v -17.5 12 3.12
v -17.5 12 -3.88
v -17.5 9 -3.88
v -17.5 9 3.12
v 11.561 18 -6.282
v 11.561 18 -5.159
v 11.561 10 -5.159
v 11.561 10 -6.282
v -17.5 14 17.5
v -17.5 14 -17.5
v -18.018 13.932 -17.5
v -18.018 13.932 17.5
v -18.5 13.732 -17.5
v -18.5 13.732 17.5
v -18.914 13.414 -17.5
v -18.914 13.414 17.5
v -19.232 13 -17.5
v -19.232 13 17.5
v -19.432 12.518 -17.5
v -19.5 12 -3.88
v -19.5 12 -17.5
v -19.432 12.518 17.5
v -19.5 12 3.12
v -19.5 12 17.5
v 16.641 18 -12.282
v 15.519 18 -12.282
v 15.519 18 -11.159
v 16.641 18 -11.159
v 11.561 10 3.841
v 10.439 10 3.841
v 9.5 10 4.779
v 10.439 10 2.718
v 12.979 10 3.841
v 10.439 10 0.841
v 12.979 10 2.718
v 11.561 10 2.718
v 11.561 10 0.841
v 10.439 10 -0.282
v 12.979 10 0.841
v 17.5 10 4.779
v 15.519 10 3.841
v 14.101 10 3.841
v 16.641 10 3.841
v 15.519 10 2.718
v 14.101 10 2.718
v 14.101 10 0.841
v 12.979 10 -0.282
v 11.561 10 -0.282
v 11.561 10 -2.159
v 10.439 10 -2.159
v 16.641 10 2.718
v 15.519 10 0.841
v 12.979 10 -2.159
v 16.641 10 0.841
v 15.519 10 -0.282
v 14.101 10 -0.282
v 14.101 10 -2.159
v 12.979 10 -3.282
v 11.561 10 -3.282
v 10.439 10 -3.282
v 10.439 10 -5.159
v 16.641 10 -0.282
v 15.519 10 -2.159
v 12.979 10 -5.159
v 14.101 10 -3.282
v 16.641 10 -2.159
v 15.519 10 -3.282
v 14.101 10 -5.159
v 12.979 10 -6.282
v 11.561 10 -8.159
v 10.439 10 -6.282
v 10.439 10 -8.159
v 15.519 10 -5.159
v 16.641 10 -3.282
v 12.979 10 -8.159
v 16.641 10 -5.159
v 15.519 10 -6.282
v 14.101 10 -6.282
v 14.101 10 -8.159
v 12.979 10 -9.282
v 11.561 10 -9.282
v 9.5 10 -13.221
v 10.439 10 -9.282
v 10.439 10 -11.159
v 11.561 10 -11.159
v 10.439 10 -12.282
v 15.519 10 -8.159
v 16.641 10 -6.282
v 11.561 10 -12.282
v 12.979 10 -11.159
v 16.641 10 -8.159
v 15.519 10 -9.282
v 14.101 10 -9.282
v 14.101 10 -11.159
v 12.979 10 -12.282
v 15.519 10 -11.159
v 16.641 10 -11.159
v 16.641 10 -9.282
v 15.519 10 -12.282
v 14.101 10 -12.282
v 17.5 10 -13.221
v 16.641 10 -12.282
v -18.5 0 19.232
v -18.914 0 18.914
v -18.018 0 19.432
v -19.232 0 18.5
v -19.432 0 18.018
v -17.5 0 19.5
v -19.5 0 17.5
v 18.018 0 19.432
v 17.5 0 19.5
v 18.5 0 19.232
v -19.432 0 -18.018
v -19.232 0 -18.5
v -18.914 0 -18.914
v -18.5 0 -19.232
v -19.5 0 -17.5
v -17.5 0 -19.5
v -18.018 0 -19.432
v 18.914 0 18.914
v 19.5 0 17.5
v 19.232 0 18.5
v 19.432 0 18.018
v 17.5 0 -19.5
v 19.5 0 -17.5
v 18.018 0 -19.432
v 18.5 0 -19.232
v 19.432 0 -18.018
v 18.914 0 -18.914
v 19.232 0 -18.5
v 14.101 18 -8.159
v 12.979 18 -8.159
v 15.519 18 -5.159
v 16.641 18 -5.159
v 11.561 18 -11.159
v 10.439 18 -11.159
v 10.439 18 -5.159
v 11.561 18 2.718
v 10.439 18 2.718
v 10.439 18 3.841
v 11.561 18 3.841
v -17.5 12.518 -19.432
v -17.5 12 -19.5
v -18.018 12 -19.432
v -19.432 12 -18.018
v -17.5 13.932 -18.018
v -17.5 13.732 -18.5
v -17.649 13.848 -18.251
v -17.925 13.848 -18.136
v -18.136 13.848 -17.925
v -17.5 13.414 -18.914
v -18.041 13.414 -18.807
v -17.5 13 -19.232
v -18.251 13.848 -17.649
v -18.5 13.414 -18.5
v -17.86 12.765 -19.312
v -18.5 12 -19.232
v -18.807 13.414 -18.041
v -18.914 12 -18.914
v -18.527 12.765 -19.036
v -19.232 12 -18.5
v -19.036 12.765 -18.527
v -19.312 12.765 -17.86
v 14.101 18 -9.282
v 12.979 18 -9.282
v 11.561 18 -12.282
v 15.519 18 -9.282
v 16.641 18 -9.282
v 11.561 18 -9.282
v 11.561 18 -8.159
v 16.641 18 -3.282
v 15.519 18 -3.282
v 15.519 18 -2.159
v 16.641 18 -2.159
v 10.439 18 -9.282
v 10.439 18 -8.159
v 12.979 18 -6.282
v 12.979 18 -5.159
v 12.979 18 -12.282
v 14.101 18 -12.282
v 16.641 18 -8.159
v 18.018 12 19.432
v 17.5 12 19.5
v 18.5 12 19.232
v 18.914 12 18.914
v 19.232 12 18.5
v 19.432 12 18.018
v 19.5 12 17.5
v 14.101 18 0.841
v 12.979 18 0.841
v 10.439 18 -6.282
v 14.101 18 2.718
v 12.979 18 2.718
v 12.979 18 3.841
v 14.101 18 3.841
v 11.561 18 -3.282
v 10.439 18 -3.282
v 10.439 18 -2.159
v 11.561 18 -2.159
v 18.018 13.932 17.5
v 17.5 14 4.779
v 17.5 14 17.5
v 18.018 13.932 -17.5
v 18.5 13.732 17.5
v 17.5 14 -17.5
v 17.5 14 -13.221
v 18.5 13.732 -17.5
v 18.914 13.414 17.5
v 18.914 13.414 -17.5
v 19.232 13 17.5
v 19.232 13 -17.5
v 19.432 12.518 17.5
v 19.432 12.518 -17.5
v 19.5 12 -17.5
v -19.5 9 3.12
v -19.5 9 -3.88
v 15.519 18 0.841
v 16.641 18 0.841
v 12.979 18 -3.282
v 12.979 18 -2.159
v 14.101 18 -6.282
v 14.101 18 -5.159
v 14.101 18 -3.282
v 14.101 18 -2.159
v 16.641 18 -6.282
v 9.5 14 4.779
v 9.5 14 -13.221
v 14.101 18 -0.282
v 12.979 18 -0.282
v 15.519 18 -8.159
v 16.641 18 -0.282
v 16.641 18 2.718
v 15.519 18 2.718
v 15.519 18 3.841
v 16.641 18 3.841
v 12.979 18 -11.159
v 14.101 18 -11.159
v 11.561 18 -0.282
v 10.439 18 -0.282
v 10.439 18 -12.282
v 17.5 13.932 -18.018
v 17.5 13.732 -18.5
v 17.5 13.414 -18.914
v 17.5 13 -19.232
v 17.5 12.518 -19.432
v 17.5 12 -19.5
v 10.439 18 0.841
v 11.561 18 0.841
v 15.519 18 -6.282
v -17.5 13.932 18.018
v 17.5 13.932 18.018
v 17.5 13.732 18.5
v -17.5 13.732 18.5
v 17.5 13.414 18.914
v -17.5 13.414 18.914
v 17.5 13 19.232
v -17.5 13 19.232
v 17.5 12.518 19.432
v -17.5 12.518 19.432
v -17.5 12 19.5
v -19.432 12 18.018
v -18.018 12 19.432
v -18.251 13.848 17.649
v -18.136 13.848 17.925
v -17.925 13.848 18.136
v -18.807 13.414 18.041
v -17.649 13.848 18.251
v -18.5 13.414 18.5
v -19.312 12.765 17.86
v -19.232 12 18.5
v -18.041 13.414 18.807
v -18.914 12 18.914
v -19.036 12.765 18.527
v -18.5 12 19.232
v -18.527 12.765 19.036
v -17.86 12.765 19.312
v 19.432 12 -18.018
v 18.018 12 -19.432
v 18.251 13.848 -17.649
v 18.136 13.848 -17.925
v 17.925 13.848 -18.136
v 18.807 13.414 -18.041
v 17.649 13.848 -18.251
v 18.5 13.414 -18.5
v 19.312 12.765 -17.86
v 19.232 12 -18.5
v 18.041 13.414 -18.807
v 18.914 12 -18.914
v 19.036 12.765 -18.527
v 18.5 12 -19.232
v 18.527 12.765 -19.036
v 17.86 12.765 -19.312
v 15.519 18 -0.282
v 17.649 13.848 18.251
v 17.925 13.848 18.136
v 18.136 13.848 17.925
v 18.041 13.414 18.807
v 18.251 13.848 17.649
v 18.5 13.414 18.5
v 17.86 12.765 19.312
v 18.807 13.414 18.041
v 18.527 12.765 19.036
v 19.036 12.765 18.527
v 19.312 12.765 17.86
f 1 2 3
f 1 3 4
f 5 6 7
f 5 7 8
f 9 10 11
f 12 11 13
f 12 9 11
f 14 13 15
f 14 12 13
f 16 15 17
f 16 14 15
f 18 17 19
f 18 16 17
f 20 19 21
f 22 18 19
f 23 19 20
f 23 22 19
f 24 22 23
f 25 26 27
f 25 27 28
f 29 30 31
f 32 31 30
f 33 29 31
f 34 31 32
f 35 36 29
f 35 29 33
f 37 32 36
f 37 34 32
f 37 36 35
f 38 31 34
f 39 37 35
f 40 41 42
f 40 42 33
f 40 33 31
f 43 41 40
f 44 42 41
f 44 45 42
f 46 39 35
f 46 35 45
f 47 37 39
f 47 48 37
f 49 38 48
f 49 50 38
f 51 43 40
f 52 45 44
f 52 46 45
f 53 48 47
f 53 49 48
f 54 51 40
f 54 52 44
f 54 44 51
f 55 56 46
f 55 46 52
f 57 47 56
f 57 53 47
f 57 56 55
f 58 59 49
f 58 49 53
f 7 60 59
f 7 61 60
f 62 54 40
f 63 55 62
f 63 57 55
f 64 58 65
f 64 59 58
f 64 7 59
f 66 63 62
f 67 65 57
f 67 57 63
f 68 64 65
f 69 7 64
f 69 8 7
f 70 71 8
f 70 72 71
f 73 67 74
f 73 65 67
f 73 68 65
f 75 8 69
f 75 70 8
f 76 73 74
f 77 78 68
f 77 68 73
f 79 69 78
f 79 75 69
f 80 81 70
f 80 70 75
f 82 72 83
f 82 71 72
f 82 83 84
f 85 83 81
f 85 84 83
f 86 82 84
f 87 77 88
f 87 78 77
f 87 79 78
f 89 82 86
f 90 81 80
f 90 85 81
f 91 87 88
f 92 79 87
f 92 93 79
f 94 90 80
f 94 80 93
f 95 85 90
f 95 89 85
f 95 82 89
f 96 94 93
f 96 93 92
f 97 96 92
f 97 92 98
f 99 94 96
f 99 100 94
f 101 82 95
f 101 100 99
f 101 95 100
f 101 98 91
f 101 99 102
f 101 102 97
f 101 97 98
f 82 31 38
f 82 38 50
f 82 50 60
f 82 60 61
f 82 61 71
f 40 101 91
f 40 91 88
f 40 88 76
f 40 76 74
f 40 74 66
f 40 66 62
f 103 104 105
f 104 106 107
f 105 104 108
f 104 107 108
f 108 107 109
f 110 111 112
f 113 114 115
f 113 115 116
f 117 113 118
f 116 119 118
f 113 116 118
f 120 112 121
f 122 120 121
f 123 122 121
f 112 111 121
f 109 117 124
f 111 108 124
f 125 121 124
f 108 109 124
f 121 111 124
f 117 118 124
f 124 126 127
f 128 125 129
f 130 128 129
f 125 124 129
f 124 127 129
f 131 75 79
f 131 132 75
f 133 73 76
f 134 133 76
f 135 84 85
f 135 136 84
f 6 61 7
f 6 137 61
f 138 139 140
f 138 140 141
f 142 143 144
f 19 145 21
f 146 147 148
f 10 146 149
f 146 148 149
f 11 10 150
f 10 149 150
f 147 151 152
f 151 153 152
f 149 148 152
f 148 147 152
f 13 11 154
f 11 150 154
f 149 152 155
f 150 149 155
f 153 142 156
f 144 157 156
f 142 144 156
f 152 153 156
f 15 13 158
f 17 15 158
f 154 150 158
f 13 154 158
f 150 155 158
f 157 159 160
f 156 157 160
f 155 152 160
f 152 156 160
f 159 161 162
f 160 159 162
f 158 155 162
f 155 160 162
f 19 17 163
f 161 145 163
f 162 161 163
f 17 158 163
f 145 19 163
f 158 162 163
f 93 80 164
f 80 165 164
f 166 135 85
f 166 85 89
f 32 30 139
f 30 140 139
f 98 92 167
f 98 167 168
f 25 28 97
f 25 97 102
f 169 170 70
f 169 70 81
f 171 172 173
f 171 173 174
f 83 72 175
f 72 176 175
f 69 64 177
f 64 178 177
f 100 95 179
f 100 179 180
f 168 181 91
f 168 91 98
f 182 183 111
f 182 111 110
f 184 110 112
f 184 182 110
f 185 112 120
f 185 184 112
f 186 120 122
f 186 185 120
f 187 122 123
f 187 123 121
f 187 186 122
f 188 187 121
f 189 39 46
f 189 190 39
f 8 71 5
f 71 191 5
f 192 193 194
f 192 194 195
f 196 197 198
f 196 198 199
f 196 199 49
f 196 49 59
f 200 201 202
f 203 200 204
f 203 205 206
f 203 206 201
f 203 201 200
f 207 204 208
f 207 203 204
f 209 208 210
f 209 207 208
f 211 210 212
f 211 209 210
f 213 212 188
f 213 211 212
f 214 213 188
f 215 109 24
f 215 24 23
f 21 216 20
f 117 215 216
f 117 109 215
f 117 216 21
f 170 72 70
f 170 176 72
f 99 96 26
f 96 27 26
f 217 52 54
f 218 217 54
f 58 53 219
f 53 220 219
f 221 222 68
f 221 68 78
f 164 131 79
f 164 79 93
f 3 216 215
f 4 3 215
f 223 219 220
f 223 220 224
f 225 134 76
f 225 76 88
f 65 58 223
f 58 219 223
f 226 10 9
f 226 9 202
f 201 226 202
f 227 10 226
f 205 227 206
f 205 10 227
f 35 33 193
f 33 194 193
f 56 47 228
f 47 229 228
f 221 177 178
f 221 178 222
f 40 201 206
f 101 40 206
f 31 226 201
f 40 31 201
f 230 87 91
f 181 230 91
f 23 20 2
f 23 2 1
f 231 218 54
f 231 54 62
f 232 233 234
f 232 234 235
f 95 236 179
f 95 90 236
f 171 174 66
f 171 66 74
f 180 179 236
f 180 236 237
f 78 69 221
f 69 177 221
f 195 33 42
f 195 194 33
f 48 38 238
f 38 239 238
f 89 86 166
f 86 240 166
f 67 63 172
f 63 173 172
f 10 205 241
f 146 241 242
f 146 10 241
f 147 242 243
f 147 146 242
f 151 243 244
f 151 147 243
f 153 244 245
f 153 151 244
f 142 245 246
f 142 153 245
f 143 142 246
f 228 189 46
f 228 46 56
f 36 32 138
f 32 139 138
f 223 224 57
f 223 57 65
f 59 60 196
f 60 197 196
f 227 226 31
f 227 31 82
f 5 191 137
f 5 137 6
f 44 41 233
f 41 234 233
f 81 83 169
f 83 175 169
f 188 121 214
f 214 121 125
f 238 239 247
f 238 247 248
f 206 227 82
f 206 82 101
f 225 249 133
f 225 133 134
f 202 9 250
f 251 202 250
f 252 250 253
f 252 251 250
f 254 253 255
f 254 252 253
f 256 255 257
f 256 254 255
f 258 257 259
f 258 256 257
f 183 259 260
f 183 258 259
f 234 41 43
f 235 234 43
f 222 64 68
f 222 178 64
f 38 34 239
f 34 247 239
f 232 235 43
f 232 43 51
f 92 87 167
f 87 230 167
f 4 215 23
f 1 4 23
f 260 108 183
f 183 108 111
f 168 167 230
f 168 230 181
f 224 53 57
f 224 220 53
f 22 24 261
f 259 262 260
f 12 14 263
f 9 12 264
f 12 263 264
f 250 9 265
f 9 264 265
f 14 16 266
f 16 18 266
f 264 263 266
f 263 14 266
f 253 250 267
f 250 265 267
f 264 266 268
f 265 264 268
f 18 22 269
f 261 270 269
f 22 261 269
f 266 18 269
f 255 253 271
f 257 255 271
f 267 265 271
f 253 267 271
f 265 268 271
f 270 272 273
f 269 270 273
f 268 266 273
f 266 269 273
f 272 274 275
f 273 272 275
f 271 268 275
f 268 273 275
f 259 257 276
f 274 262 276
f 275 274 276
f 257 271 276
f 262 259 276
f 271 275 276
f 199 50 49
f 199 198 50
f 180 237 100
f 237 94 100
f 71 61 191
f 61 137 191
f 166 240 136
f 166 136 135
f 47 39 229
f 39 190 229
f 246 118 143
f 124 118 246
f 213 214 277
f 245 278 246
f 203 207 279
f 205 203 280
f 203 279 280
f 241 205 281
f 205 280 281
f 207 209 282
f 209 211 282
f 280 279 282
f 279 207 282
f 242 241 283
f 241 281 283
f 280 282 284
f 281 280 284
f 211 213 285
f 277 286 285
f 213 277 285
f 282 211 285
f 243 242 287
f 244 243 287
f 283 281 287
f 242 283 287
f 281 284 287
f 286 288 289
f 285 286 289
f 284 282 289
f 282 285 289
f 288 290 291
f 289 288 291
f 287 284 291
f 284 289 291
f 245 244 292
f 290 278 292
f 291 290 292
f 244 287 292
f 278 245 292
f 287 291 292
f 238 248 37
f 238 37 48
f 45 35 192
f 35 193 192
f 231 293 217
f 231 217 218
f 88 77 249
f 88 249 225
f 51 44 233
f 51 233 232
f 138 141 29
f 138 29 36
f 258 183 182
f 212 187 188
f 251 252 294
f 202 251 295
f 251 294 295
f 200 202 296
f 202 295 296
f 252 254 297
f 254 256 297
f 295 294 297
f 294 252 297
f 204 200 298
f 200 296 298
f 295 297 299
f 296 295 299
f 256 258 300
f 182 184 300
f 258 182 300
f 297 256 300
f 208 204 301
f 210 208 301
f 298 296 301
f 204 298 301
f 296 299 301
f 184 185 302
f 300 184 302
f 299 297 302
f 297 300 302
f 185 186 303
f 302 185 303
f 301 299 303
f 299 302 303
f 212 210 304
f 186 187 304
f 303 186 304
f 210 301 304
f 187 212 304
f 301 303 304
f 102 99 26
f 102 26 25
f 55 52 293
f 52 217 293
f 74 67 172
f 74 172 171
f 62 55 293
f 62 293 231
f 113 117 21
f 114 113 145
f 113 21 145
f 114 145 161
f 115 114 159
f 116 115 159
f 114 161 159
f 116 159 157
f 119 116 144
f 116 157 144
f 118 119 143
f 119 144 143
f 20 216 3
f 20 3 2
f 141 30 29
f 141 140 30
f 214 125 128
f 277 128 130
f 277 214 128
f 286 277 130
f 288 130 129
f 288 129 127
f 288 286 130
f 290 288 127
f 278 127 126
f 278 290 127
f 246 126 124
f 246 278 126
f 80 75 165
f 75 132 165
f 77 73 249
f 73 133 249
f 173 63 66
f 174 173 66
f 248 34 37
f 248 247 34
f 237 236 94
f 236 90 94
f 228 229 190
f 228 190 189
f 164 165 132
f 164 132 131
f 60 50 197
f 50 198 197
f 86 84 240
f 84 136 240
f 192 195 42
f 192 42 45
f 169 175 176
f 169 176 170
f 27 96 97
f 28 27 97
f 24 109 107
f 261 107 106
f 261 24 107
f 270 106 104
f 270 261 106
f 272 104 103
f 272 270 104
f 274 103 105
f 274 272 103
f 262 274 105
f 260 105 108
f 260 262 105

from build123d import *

# Parameters (mm, degrees)
SKETCH1_W           = 39
SKETCH1_H           = 39
BOSS_EXTRUDE1_DEPTH = 14
FILLET1_R           = 2
FILLET2_R           = 2
SKETCH2_W           = 8
SKETCH2_H           = 18
SKETCH2_W_2         = 1.12294134
SKETCH2_H_2         = 1.122941341
CUT_EXTRUDE1_DEPTH  = 4
SKETCH2_2_W         = 1.12294134
SKETCH2_2_H         = 1.122941341
BOSS_EXTRUDE3_DEPTH = 4
SKETCH3_W           = 7
SKETCH3_H           = 3
CUT_EXTRUDE2_DEPTH  = 2


with BuildPart() as part:
    # Sketch1 → Boss-Extrude1 (new body)
    with BuildSketch(Plane(origin=(0, 0, 0), x_dir=(1, 0, 0), z_dir=(0, 1, 0))):
        Rectangle(SKETCH1_W, SKETCH1_H)
    extrude(amount=BOSS_EXTRUDE1_DEPTH)

    # Fillet1
    fillet1_edges = [part.edges().sort_by_distance(p)[0] for p in [
        (19.5, 7, 19.5),
        (-19.5, 7, 19.5),
        (-19.5, 7, -19.5),
        (19.5, 7, -19.5),
    ]]
    fillet(fillet1_edges, radius=FILLET1_R)

    # Fillet2
    fillet2_edges = [part.edges().sort_by_distance(p)[0] for p in [
        (0, 14, 19.5),
        (-19.5, 14, 0),
        (19.5, 14, 0),
        (0, 14, -19.5),
        (18.914213562, 14, 18.914213562),
        (18.914213562, 14, -18.914213562),
        (-18.914213562, 14, -18.914213562),
        (-18.914213562, 14, 18.914213562),
    ]]
    fillet(fillet2_edges, radius=FILLET2_R)

    # Sketch2 → Cut-Extrude1 (cut)
    with BuildSketch(Plane(origin=(0, 14, 0), x_dir=(1, 0, 0), z_dir=(0, 1, 0))):
        with Locations((13.5, 4.220700243)):
            Rectangle(SKETCH2_W, SKETCH2_H)
        with Locations((13.54, 11.720700244)):
            Rectangle(SKETCH2_W_2, SKETCH2_H_2, mode=Mode.SUBTRACT)
        with Locations((11, 11.720700244)):
            Rectangle(SKETCH2_W_2, SKETCH2_H_2, mode=Mode.SUBTRACT)
        with Locations((16.08, 11.720700244)):
            Rectangle(SKETCH2_W_2, SKETCH2_H_2, mode=Mode.SUBTRACT)
        with Locations((11, 8.720700244)):
            Rectangle(SKETCH2_W_2, SKETCH2_H_2, mode=Mode.SUBTRACT)
        with Locations((13.54, 8.720700244)):
            Rectangle(SKETCH2_W_2, SKETCH2_H_2, mode=Mode.SUBTRACT)
        with Locations((16.08, 8.720700244)):
            Rectangle(SKETCH2_W_2, SKETCH2_H_2, mode=Mode.SUBTRACT)
        with Locations((11, 5.720700244)):
            Rectangle(SKETCH2_W_2, SKETCH2_H_2, mode=Mode.SUBTRACT)
        with Locations((13.54, 5.720700244)):
            Rectangle(SKETCH2_W_2, SKETCH2_H_2, mode=Mode.SUBTRACT)
        with Locations((16.08, 5.720700244)):
            Rectangle(SKETCH2_W_2, SKETCH2_H_2, mode=Mode.SUBTRACT)
        with Locations((11, 2.720700244)):
            Rectangle(SKETCH2_W_2, SKETCH2_H_2, mode=Mode.SUBTRACT)
        with Locations((13.54, 2.720700244)):
            Rectangle(SKETCH2_W_2, SKETCH2_H_2, mode=Mode.SUBTRACT)
        with Locations((16.08, 2.720700244)):
            Rectangle(SKETCH2_W_2, SKETCH2_H_2, mode=Mode.SUBTRACT)
        with Locations((11, -0.279299757)):
            Rectangle(SKETCH2_W_2, SKETCH2_H_2, mode=Mode.SUBTRACT)
        with Locations((13.54, -0.279299757)):
            Rectangle(SKETCH2_W_2, SKETCH2_H_2, mode=Mode.SUBTRACT)
        with Locations((16.08, -0.279299757)):
            Rectangle(SKETCH2_W_2, SKETCH2_H_2, mode=Mode.SUBTRACT)
        with Locations((11, -3.279299757)):
            Rectangle(SKETCH2_W_2, SKETCH2_H_2, mode=Mode.SUBTRACT)
        with Locations((13.54, -3.279299757)):
            Rectangle(SKETCH2_W_2, SKETCH2_H_2, mode=Mode.SUBTRACT)
        with Locations((16.08, -3.279299757)):
            Rectangle(SKETCH2_W_2, SKETCH2_H_2, mode=Mode.SUBTRACT)
    extrude(amount=-CUT_EXTRUDE1_DEPTH, mode=Mode.SUBTRACT)

    # Sketch2<2> → Boss-Extrude3 (add)
    with BuildSketch(Plane(origin=(0, 14, 0), x_dir=(1, 0, 0), z_dir=(0, 1, 0))):
        with Locations((13.54, 11.720700244)):
            Rectangle(SKETCH2_2_W, SKETCH2_2_H)
        with Locations((11, 11.720700244)):
            Rectangle(SKETCH2_2_W, SKETCH2_2_H)
        with Locations((16.08, 11.720700244)):
            Rectangle(SKETCH2_2_W, SKETCH2_2_H)
        with Locations((11, 8.720700244)):
            Rectangle(SKETCH2_2_W, SKETCH2_2_H)
        with Locations((13.54, 8.720700244)):
            Rectangle(SKETCH2_2_W, SKETCH2_2_H)
        with Locations((16.08, 8.720700244)):
            Rectangle(SKETCH2_2_W, SKETCH2_2_H)
        with Locations((11, 5.720700244)):
            Rectangle(SKETCH2_2_W, SKETCH2_2_H)
        with Locations((13.54, 5.720700244)):
            Rectangle(SKETCH2_2_W, SKETCH2_2_H)
        with Locations((16.08, 5.720700244)):
            Rectangle(SKETCH2_2_W, SKETCH2_2_H)
        with Locations((11, 2.720700244)):
            Rectangle(SKETCH2_2_W, SKETCH2_2_H)
        with Locations((13.54, 2.720700244)):
            Rectangle(SKETCH2_2_W, SKETCH2_2_H)
        with Locations((16.08, 2.720700244)):
            Rectangle(SKETCH2_2_W, SKETCH2_2_H)
        with Locations((11, -0.279299757)):
            Rectangle(SKETCH2_2_W, SKETCH2_2_H)
        with Locations((13.54, -0.279299757)):
            Rectangle(SKETCH2_2_W, SKETCH2_2_H)
        with Locations((16.08, -0.279299757)):
            Rectangle(SKETCH2_2_W, SKETCH2_2_H)
        with Locations((11, -3.279299757)):
            Rectangle(SKETCH2_2_W, SKETCH2_2_H)
        with Locations((13.54, -3.279299757)):
            Rectangle(SKETCH2_2_W, SKETCH2_2_H)
        with Locations((16.08, -3.279299757)):
            Rectangle(SKETCH2_2_W, SKETCH2_2_H)
    extrude(amount=BOSS_EXTRUDE3_DEPTH)

    # Sketch3 → Cut-Extrude2 (cut)
    with BuildSketch(Plane.ZY.offset(19.5)):
        with Locations((-0.380147746, 10.5)):
            Rectangle(SKETCH3_W, SKETCH3_H)
    extrude(amount=-CUT_EXTRUDE2_DEPTH, mode=Mode.SUBTRACT)


solid = part.part
